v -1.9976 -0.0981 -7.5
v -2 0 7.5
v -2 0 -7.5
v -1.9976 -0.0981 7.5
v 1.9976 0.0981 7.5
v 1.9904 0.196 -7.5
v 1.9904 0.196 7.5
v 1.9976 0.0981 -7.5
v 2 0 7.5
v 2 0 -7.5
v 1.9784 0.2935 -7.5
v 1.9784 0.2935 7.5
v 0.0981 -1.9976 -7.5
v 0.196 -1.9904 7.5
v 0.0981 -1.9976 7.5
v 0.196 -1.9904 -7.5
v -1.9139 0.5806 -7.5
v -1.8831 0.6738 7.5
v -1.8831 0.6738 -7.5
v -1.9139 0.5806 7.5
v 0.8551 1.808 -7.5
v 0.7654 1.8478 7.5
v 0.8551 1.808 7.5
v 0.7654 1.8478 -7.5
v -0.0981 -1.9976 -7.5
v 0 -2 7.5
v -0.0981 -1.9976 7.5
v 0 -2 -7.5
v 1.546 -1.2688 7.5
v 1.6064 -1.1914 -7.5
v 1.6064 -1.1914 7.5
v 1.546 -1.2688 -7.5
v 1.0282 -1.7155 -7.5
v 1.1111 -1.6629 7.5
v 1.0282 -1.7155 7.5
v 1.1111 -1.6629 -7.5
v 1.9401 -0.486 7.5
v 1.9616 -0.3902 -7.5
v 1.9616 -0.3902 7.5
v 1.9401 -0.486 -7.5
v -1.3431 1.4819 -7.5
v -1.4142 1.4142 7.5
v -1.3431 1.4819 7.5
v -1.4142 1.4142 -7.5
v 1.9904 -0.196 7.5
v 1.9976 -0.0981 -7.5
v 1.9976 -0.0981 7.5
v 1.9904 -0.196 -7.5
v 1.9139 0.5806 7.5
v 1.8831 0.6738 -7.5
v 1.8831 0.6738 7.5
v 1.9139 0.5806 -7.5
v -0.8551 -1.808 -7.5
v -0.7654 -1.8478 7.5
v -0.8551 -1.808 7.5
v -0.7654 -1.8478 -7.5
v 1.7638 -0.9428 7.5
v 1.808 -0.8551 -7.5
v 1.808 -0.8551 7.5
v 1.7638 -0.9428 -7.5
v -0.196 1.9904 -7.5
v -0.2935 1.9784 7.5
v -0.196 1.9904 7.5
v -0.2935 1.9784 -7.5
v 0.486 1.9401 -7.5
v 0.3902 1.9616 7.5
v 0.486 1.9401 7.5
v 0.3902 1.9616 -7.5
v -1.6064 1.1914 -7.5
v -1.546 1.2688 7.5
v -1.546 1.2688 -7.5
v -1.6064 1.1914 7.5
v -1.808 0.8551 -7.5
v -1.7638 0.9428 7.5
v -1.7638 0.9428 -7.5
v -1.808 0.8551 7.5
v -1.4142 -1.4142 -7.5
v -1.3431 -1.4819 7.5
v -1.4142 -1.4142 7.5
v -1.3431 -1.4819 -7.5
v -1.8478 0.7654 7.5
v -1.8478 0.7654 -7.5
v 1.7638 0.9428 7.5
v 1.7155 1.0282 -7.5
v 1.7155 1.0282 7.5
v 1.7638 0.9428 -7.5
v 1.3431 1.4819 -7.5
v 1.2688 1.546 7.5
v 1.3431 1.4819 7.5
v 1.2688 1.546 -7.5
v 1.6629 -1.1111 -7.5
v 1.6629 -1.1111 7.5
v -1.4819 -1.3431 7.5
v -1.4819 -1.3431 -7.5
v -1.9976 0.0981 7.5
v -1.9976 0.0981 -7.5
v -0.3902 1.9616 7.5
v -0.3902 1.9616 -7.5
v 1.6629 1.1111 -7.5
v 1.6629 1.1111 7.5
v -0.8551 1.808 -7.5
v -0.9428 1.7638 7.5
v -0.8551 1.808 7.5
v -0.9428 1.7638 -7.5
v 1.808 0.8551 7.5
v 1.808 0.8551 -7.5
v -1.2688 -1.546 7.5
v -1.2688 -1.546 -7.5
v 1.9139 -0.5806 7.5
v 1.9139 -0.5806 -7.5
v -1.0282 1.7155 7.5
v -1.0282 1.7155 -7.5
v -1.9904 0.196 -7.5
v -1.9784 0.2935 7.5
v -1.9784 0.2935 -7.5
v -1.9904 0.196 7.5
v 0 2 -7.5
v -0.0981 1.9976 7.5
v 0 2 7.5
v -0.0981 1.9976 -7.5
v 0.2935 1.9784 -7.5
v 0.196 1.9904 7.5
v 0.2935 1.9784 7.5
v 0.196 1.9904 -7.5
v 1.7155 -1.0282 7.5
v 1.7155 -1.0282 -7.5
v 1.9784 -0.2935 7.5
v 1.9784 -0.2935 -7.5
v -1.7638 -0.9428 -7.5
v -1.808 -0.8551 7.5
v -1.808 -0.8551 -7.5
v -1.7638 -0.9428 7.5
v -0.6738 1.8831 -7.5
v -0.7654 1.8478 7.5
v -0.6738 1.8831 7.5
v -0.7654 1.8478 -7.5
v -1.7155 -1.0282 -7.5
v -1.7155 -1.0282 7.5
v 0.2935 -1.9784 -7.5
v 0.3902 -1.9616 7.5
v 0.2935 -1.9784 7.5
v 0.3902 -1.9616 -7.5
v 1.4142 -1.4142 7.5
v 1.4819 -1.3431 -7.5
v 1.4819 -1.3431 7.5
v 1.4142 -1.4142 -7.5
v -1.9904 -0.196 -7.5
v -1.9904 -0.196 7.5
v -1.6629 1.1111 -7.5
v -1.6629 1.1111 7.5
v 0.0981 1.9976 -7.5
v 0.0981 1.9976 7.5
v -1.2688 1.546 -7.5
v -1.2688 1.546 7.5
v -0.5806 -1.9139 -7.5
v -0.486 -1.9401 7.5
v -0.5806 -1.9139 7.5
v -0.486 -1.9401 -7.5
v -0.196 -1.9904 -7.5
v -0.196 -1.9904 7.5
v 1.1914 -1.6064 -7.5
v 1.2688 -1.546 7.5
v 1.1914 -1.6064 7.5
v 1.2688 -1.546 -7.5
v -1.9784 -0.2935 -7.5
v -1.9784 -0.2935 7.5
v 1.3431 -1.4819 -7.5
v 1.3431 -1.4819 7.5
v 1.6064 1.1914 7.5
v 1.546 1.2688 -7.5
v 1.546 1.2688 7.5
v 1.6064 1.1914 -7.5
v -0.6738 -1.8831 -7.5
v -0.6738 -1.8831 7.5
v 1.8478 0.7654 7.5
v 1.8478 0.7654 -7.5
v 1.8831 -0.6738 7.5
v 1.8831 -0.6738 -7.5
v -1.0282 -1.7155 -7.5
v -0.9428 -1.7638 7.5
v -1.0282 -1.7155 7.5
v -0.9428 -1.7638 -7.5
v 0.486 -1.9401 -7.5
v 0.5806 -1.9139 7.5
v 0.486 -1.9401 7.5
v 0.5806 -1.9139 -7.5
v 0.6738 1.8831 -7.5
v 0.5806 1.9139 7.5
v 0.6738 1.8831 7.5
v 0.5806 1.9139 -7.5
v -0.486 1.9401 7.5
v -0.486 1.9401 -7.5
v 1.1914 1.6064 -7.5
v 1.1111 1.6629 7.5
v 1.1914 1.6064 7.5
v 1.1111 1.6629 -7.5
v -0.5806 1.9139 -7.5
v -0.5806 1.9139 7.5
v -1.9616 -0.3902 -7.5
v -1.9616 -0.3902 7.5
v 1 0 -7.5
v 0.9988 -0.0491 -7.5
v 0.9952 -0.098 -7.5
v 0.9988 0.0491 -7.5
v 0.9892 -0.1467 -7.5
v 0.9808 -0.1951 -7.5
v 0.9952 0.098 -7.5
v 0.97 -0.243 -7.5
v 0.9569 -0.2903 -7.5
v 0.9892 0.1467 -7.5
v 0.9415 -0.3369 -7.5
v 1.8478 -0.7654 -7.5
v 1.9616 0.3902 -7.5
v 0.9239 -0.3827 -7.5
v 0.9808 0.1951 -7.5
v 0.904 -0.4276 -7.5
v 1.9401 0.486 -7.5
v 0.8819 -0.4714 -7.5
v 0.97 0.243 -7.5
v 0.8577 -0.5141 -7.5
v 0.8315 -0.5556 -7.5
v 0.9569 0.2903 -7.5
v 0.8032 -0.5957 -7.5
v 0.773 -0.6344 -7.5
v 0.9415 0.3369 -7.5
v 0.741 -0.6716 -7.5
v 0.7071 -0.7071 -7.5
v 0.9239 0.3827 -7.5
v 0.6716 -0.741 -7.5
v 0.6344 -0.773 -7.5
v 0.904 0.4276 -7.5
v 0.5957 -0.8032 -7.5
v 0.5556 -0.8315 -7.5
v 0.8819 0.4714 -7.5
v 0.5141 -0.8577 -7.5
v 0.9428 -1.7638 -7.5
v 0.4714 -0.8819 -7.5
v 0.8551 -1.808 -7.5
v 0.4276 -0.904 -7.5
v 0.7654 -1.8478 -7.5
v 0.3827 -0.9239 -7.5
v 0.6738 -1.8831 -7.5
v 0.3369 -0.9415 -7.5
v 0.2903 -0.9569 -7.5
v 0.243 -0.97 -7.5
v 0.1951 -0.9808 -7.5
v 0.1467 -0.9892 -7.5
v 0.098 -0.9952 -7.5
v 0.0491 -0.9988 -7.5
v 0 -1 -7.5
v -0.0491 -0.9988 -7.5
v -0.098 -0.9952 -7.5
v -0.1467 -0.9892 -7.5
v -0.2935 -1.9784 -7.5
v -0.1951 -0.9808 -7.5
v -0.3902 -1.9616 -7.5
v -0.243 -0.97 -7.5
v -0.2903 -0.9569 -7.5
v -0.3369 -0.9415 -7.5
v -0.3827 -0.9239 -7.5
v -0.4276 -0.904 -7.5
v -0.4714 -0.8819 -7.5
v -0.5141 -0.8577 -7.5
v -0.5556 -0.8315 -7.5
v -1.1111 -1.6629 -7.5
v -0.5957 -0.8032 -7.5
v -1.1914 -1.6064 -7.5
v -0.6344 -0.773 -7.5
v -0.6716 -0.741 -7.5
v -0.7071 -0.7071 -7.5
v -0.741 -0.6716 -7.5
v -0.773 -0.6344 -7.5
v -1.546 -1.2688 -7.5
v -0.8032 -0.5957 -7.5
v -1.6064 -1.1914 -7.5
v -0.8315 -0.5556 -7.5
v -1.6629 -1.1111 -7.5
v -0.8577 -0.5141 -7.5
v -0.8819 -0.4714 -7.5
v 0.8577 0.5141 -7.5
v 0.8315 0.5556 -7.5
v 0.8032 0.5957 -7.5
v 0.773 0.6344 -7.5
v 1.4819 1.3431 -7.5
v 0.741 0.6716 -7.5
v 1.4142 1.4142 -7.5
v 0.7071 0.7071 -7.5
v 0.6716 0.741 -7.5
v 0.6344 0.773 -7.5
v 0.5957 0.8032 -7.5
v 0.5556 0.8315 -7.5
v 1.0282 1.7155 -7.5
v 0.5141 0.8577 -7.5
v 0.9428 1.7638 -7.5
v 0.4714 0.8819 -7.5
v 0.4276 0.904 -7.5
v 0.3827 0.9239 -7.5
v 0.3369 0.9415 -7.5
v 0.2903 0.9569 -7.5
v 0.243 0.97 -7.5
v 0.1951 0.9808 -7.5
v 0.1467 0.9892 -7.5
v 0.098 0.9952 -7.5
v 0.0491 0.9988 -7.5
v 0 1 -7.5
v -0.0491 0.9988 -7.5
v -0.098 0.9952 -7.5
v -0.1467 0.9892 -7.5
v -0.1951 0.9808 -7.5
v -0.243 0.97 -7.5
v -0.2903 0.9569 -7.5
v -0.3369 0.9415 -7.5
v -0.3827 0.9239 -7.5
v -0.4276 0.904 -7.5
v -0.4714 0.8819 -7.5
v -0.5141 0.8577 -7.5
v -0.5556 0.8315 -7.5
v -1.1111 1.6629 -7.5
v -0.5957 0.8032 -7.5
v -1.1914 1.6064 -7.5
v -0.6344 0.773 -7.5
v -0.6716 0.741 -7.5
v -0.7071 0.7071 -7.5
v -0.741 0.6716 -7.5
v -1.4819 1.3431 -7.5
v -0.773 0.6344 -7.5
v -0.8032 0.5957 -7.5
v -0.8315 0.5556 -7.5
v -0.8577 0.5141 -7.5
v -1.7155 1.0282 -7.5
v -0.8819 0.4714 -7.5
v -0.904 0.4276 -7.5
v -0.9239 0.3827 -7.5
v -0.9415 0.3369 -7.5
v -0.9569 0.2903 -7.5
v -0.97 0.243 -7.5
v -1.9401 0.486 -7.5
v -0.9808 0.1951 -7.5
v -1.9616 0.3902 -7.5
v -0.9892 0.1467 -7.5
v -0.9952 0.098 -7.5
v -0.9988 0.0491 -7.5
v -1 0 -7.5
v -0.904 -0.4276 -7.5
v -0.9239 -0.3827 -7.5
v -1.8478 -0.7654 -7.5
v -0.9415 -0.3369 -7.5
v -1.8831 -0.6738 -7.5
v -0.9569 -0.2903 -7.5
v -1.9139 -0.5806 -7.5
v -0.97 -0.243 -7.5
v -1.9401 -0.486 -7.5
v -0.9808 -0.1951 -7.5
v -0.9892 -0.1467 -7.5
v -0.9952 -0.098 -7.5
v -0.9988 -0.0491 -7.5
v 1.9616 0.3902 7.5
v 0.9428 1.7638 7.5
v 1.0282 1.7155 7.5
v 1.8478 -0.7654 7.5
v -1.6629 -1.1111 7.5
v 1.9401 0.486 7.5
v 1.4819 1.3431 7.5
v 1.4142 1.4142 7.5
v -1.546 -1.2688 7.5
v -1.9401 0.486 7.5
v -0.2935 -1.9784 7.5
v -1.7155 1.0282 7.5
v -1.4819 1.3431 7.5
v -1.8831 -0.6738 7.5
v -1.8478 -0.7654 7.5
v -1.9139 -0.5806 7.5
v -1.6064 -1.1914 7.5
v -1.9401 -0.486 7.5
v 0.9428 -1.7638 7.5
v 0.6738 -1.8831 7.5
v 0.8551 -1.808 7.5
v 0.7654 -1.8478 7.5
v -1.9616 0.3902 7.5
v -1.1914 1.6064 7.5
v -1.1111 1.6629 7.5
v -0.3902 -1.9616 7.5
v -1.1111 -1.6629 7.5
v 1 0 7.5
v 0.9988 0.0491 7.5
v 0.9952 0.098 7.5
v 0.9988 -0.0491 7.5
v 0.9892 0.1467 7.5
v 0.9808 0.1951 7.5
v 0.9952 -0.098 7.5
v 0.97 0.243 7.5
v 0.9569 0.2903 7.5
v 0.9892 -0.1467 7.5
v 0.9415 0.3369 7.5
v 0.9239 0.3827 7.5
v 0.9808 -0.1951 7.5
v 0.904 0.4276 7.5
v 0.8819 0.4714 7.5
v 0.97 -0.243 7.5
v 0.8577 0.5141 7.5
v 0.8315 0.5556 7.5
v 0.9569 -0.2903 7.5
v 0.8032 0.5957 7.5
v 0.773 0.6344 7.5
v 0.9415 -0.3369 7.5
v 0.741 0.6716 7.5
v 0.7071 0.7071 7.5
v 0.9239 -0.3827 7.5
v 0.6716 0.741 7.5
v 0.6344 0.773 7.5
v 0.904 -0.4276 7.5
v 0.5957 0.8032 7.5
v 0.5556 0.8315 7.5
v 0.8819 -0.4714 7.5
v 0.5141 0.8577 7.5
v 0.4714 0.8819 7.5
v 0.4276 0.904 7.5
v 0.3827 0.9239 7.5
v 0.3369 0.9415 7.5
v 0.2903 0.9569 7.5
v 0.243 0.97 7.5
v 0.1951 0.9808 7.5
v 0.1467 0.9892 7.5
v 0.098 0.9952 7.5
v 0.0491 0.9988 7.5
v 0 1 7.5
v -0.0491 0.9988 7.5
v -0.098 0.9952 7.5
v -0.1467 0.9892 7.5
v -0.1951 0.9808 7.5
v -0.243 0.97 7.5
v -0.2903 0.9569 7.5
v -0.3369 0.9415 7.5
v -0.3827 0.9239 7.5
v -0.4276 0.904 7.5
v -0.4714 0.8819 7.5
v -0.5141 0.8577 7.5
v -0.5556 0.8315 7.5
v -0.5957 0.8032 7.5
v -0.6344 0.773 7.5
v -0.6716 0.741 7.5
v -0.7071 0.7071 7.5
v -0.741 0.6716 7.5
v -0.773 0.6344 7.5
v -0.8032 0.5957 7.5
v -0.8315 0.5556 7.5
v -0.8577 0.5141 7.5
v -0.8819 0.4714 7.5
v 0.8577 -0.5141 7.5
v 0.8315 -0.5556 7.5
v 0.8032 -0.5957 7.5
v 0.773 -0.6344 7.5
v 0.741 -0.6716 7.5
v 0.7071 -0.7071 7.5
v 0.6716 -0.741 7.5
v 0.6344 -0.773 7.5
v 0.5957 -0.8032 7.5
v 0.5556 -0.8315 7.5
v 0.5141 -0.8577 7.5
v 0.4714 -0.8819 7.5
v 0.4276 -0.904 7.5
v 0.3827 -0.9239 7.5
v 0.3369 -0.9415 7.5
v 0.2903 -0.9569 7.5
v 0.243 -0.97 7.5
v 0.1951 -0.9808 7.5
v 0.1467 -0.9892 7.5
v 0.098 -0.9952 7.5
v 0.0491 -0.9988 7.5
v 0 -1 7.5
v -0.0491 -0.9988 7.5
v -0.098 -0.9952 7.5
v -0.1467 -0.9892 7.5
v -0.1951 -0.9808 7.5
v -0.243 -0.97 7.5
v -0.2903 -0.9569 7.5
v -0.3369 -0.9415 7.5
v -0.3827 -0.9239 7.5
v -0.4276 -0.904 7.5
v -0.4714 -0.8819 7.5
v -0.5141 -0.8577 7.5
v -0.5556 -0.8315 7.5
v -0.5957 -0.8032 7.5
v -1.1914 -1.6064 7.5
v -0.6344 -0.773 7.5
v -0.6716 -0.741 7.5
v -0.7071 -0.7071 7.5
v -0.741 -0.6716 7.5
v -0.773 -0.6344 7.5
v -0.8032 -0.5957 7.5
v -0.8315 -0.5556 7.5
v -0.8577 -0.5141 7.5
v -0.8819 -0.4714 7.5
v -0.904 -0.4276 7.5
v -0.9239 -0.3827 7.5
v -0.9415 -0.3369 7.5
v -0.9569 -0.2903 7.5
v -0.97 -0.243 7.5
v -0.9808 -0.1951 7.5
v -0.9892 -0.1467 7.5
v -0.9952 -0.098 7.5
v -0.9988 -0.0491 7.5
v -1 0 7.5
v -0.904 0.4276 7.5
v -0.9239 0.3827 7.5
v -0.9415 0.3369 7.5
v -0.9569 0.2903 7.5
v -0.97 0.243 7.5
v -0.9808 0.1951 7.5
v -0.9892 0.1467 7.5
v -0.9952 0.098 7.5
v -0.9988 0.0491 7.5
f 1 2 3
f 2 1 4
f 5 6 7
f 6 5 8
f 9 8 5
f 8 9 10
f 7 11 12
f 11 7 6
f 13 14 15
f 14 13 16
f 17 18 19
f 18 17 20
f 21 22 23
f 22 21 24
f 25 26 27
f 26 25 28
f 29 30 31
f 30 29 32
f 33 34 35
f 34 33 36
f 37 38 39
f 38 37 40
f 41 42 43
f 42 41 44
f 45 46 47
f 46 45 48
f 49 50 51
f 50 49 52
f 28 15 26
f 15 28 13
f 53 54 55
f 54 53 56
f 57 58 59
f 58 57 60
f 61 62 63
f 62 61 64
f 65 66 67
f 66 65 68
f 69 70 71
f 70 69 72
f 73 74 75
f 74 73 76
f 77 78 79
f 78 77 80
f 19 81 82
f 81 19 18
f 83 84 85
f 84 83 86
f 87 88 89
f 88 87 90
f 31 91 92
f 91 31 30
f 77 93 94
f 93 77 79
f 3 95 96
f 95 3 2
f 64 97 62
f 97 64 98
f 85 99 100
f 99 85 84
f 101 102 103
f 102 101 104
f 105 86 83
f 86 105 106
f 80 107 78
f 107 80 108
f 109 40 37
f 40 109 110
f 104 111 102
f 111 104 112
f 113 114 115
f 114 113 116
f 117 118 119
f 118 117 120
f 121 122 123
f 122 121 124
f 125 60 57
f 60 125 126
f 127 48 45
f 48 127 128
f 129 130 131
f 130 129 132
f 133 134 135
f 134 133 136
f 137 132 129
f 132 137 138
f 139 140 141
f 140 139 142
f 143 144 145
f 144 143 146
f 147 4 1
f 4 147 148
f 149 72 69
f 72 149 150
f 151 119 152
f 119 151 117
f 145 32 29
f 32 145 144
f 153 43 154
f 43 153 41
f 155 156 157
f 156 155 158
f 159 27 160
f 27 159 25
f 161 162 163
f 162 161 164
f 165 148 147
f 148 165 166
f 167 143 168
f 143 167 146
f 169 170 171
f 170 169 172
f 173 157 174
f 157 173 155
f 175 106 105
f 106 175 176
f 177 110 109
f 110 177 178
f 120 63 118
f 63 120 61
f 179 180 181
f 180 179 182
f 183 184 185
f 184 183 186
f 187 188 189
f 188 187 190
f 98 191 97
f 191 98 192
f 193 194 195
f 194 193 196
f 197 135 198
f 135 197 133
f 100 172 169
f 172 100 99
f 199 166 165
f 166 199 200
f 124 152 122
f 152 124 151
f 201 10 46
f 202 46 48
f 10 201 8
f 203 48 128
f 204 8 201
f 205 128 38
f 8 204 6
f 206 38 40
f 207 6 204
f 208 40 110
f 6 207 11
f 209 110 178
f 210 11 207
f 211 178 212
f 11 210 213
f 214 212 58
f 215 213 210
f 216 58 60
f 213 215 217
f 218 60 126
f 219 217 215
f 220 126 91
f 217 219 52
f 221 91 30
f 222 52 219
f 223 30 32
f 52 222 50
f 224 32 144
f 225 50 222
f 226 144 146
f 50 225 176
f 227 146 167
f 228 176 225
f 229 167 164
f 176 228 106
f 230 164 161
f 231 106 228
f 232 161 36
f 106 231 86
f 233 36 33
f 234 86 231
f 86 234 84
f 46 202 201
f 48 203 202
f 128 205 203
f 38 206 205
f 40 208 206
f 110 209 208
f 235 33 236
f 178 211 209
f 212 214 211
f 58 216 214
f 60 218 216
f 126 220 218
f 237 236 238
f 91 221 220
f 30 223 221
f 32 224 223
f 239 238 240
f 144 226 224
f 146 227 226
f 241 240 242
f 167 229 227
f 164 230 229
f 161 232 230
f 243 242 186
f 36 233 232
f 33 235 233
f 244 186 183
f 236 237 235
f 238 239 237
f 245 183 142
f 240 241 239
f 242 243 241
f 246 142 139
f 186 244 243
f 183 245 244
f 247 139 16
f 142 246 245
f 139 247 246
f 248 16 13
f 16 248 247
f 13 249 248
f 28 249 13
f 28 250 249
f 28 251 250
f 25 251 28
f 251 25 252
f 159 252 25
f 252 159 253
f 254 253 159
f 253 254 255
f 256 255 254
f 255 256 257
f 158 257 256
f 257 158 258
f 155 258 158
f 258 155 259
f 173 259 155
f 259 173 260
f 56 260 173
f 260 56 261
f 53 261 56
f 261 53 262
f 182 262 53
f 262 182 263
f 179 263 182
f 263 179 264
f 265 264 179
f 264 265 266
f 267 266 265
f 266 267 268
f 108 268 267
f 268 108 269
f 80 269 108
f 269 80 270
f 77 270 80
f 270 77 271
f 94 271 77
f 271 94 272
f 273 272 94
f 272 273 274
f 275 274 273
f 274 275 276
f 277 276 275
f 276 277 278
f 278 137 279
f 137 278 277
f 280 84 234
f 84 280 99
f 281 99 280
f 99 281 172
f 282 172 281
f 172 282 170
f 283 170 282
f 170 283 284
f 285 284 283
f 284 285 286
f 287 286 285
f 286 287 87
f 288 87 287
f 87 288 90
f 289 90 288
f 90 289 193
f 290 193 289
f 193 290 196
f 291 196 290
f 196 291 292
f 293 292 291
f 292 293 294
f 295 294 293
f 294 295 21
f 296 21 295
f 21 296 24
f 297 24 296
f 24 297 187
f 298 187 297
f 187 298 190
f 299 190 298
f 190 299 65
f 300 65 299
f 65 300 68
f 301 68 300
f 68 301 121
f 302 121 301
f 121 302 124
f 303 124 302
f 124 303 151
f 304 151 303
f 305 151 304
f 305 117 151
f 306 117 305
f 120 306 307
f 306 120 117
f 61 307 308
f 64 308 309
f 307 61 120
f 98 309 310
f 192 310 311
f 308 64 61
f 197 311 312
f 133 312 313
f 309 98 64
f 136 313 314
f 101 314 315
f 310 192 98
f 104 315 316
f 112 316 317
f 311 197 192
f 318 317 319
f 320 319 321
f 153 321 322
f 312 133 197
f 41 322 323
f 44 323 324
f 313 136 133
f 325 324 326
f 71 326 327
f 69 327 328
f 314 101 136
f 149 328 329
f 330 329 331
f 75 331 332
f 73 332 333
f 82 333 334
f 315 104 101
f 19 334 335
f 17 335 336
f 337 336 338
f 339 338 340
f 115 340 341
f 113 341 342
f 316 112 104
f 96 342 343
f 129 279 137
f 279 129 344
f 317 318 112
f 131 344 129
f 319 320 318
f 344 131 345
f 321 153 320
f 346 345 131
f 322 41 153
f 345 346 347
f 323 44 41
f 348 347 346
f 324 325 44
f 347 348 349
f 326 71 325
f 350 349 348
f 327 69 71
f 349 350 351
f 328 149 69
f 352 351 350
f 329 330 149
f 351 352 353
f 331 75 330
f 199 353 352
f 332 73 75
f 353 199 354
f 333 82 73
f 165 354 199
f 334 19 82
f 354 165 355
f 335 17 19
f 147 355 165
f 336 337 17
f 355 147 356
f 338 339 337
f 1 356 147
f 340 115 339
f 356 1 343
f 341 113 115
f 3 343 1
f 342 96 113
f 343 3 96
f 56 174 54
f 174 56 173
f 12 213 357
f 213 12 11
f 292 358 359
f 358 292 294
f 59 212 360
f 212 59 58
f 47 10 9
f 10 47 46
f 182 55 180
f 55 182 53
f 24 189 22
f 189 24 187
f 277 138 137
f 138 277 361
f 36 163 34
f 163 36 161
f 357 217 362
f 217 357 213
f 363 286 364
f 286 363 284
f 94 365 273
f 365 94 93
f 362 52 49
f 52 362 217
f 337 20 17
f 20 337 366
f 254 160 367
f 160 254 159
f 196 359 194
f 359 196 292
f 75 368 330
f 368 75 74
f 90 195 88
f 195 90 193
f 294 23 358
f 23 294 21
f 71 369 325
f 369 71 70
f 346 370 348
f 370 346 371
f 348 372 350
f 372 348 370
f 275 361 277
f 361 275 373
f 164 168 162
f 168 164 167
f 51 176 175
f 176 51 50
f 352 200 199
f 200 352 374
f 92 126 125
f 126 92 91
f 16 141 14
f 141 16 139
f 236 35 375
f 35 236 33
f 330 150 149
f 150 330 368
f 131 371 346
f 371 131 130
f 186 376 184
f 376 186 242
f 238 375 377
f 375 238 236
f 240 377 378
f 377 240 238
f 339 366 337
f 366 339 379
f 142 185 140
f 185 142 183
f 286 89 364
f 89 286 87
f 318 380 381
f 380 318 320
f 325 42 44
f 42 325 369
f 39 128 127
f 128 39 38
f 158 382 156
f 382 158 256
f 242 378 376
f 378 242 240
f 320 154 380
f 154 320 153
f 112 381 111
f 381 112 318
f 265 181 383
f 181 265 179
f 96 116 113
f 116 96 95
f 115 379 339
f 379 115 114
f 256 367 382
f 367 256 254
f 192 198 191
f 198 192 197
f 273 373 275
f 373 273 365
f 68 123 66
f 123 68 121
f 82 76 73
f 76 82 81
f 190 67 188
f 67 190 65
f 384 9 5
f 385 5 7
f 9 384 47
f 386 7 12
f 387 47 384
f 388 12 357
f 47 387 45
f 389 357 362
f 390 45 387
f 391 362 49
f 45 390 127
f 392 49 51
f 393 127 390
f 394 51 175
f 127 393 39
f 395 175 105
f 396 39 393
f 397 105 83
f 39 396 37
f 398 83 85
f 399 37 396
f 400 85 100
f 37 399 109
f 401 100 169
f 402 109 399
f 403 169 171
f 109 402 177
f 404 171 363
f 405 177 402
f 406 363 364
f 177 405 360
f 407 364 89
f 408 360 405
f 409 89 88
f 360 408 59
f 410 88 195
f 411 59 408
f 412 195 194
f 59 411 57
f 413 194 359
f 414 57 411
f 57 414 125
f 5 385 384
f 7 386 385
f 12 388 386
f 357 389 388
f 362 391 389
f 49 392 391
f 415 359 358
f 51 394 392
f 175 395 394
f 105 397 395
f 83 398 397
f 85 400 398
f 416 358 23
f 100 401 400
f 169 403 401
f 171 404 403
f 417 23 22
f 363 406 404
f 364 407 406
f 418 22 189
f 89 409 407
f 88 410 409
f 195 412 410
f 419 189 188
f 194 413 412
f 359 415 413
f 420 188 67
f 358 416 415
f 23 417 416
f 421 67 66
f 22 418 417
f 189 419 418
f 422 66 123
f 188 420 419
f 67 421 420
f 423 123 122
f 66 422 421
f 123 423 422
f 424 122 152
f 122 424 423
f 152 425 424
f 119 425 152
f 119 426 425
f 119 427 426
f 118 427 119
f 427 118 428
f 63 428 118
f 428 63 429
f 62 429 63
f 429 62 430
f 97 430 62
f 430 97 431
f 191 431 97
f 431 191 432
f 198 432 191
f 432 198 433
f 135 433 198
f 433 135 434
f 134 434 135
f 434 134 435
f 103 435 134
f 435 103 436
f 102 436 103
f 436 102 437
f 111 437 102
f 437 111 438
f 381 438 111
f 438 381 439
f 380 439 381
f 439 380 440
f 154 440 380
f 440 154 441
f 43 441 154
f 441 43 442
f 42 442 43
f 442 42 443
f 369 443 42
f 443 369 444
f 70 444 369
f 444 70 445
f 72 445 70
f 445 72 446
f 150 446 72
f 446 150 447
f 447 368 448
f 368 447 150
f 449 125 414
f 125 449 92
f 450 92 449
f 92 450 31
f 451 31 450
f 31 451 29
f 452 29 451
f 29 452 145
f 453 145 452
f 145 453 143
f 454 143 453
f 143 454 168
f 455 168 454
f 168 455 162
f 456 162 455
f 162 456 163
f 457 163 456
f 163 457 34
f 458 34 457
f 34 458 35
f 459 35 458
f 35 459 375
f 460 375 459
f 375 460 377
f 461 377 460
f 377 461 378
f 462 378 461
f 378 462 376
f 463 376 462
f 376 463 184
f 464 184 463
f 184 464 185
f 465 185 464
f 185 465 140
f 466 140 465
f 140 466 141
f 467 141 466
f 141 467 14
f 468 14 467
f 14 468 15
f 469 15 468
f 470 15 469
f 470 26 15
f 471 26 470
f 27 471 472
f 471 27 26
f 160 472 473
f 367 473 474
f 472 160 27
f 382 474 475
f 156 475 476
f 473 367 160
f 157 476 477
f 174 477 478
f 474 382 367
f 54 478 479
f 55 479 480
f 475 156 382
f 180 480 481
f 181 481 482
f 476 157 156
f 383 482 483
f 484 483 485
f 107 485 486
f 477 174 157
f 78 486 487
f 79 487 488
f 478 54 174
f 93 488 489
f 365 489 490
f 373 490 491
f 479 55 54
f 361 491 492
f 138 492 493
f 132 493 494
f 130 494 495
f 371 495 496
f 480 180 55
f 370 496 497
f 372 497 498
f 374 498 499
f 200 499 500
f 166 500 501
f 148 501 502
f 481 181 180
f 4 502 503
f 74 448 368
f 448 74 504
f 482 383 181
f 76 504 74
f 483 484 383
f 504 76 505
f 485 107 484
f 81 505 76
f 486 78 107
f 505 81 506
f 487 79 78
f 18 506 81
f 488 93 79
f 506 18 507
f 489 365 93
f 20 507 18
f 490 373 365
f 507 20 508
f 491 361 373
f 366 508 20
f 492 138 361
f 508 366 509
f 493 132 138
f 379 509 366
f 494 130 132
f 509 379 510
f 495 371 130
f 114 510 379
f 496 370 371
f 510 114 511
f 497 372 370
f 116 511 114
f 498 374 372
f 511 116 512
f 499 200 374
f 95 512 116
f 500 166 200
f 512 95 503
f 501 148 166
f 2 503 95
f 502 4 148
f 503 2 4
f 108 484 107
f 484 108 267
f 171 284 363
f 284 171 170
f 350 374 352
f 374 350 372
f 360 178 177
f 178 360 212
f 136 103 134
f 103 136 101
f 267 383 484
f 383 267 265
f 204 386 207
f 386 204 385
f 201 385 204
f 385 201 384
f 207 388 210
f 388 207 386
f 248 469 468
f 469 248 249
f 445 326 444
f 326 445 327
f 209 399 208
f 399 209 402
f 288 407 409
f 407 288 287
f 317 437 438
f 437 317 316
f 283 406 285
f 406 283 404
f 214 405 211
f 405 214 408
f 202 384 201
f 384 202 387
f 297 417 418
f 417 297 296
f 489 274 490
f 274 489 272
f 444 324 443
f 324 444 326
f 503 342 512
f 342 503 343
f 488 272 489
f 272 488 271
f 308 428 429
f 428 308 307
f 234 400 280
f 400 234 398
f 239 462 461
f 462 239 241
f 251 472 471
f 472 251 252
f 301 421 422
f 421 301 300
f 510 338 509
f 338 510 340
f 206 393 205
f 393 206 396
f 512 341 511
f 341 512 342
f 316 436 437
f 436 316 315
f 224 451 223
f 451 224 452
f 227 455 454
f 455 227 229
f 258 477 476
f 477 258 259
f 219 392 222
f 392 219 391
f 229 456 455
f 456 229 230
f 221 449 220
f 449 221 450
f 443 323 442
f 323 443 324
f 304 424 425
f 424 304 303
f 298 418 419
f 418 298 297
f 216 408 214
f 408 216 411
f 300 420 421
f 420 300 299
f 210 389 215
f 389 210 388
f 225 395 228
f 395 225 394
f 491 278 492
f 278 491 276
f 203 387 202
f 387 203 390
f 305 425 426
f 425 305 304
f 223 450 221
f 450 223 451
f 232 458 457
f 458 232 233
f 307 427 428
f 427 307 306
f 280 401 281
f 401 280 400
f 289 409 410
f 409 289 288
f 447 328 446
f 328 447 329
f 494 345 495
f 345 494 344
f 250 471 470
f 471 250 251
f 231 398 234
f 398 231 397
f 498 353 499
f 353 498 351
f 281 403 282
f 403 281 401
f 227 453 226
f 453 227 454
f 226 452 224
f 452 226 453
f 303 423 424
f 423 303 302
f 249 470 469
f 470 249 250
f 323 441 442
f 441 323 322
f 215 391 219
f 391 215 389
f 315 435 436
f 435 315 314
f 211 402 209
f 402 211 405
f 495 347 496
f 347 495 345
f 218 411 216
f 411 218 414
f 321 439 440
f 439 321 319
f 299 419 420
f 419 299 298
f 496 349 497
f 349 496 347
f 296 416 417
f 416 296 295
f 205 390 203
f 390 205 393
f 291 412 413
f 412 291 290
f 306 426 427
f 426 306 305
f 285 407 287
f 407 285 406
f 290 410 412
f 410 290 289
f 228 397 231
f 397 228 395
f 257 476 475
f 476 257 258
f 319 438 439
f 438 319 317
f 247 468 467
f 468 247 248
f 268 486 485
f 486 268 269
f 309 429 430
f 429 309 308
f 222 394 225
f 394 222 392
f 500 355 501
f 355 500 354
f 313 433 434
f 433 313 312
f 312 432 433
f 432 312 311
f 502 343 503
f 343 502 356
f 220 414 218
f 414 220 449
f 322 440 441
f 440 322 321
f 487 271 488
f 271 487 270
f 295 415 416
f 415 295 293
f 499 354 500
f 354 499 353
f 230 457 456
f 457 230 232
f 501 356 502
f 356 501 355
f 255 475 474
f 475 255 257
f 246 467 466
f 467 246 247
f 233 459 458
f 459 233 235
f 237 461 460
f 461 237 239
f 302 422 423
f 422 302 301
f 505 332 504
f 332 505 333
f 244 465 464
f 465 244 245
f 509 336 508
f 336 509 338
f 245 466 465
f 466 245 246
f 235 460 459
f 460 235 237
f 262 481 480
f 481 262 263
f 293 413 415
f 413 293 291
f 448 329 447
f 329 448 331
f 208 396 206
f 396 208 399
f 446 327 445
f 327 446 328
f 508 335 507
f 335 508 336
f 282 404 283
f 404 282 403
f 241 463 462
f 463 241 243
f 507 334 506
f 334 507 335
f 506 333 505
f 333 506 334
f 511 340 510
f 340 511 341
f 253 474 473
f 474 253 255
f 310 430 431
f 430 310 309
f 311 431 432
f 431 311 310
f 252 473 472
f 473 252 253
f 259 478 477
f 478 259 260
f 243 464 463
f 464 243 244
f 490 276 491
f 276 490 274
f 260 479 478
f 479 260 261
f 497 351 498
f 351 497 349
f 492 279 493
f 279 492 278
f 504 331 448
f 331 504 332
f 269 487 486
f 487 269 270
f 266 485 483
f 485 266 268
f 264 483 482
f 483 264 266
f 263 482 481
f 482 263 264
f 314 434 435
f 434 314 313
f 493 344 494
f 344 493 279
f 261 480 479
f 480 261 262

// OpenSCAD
// PTFE Tubing (hollow, smooth circular cross-section)

// Parameters
length  = 15;   //[8:30:1]
od      = 4;    //[2:8:0.1]
id      = 2;    //[1:6:0.1]
center  = 1;    //[0:1:1]
overlap = 1;    //[0.5:2:0.1]

// Smoothness (avoid faceted/polygonal look)
$fn = 128;

module tubing() {
  // Ensure valid annulus with a minimum wall thickness
  min_wall = 0.2;
  inner_d  = min(id, od - 2*min_wall);
  inner_r  = max(0.01, inner_d/2);
  outer_r  = od/2;

  // Centering control
  z0 = (center==1) ? 0 : length/2;

  color([0.85, 0.85, 0.8])  // Off-white for PTFE
  difference() {
    translate([0,0,z0])
      cylinder(r=outer_r, h=length, center=(center==1));

    // Inner bore: extend beyond both ends to guarantee a clean through-hole
    translate([0,0,z0])
      cylinder(r=inner_r, h=length + 2*overlap, center=(center==1));
  }
}

tubing();
